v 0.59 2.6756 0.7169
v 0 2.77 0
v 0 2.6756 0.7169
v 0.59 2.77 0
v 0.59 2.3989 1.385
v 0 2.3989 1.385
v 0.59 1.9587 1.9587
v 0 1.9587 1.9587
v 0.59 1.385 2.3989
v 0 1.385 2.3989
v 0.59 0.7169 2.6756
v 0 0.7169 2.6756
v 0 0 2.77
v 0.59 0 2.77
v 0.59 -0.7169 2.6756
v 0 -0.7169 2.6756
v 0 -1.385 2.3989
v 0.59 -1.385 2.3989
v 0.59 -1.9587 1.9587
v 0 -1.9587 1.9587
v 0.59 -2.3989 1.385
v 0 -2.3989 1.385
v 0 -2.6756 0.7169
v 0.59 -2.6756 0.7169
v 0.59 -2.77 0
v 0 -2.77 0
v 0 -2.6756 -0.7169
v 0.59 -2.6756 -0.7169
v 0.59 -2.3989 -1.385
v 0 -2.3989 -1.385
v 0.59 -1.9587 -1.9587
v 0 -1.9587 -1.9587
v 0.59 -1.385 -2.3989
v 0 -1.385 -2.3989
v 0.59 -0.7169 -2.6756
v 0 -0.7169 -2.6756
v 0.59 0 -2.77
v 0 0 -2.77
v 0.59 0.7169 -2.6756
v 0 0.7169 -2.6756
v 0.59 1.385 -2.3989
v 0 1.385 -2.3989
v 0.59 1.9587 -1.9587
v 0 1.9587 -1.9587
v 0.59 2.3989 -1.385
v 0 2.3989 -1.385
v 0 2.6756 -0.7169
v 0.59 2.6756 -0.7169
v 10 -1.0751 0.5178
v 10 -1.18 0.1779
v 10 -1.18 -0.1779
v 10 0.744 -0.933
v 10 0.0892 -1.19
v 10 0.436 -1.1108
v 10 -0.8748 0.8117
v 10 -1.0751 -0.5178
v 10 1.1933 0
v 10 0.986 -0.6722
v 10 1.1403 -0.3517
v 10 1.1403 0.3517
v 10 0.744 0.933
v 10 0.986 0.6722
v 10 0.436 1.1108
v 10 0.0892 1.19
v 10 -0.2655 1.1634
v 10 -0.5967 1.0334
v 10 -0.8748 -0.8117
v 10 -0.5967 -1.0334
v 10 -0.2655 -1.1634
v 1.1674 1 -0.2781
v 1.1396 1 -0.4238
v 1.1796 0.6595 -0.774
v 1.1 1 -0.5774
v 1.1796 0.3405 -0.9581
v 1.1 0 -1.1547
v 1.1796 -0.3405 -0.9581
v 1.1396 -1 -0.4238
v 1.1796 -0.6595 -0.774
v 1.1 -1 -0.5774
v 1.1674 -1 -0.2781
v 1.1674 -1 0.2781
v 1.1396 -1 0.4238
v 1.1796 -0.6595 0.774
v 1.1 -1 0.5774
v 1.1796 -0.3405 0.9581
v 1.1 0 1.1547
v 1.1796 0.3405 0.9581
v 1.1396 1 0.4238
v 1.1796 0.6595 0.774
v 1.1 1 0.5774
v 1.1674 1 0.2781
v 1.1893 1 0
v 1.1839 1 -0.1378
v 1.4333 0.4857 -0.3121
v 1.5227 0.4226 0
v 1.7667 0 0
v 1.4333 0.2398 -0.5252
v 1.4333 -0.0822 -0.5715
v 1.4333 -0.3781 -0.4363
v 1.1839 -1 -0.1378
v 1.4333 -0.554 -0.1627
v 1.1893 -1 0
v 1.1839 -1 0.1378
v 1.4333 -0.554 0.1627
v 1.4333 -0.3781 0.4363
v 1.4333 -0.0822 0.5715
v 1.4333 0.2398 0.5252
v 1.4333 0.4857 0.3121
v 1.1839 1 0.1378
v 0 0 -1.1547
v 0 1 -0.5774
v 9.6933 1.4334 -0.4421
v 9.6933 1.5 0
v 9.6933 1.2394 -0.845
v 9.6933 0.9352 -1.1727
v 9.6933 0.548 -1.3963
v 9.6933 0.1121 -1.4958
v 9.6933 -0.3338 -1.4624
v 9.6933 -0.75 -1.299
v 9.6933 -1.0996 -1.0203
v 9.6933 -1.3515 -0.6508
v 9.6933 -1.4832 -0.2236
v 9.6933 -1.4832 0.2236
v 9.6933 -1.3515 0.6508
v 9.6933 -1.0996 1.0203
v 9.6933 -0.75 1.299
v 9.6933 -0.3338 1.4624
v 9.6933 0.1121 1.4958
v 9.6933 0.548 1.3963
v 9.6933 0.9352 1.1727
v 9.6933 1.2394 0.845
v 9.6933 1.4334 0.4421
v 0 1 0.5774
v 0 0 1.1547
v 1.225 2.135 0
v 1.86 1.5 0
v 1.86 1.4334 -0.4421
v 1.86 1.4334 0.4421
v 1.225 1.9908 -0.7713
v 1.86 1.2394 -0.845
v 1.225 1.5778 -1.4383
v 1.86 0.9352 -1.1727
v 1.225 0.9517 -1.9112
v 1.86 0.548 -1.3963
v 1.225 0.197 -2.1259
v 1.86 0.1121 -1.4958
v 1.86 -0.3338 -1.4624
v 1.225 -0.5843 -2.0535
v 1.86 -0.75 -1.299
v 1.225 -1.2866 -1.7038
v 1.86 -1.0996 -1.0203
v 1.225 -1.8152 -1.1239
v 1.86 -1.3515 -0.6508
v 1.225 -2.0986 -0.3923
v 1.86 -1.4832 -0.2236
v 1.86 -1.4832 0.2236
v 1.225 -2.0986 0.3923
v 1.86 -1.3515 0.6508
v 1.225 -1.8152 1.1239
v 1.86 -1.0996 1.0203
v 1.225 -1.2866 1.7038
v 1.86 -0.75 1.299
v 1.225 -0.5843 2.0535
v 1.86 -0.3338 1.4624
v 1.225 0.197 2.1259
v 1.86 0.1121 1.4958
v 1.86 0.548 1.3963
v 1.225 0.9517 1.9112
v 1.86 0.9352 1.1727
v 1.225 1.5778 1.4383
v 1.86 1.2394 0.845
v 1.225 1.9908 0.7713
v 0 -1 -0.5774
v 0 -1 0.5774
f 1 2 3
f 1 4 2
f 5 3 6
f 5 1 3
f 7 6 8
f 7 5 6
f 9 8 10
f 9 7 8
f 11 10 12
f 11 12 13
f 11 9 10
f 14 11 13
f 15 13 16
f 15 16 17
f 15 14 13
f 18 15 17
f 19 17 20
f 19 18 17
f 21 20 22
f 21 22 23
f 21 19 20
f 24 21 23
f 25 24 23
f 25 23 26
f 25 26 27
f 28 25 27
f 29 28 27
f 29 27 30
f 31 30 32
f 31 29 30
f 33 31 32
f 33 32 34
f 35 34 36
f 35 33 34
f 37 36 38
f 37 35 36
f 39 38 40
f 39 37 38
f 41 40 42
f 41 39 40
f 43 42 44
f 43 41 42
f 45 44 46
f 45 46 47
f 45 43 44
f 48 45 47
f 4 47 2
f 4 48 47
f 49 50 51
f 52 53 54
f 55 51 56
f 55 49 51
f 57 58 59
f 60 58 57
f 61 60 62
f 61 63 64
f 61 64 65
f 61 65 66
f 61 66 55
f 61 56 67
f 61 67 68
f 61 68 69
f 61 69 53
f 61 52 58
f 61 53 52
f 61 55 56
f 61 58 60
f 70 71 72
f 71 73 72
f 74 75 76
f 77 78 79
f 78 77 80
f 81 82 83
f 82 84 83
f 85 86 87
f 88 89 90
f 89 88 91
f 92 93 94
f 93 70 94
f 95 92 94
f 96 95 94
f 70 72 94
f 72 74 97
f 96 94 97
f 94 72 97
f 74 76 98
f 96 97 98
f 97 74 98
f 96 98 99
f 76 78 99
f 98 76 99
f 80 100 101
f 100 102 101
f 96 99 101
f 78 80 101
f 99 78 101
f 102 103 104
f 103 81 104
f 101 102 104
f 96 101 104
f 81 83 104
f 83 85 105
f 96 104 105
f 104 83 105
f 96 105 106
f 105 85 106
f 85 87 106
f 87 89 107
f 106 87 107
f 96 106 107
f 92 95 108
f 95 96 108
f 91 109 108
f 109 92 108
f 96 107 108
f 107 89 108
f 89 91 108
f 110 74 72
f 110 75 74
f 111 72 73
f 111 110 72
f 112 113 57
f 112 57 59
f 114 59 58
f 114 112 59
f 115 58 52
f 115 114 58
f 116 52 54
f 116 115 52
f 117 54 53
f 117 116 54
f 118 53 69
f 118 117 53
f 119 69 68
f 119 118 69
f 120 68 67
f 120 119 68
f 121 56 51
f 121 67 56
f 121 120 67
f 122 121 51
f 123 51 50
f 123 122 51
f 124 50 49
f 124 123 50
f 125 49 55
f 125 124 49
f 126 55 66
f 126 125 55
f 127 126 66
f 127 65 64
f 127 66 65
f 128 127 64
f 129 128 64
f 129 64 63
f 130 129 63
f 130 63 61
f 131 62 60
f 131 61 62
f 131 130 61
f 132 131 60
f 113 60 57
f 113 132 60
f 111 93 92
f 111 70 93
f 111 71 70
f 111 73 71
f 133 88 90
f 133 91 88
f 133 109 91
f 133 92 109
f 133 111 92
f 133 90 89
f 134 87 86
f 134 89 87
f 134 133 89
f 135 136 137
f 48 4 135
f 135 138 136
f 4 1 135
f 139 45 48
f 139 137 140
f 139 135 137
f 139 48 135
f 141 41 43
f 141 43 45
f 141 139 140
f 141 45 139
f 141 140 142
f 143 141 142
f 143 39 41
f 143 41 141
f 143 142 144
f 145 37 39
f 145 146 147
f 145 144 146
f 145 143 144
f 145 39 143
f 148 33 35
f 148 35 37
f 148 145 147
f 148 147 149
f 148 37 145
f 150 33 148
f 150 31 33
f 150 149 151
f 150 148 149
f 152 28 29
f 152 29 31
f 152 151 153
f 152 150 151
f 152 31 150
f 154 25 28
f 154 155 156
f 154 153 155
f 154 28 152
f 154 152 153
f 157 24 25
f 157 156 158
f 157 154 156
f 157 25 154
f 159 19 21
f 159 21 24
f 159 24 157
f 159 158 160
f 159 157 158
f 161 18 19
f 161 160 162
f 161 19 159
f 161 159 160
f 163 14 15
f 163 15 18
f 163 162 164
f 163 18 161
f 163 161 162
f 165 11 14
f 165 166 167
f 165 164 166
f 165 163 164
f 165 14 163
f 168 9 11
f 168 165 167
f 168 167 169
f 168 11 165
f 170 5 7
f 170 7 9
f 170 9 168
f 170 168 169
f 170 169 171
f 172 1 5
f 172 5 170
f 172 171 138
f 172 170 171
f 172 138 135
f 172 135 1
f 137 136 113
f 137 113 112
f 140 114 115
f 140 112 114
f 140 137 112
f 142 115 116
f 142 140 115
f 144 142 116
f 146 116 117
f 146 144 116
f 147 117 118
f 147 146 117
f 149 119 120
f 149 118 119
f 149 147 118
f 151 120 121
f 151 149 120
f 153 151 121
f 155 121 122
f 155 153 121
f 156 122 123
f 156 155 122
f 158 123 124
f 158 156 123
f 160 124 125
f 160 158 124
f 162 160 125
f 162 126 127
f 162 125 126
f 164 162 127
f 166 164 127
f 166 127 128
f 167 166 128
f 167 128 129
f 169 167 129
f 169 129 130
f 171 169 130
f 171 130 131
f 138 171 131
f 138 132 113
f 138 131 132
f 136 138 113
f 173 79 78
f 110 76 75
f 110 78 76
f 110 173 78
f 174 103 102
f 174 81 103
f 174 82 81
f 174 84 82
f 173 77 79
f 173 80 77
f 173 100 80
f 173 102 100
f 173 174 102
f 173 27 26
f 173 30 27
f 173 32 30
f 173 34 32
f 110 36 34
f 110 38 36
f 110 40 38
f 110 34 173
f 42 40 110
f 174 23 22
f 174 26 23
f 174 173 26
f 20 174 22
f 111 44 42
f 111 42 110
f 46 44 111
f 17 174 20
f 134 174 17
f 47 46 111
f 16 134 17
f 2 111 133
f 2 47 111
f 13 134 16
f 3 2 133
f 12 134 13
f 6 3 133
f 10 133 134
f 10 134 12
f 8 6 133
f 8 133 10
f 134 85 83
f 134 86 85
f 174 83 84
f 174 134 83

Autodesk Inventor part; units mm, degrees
ref_plane "YZ Plane" through (0, 0, 0) normal (1, 0, 0) x (0, 1, 0)
ref_plane "XZ Plane" through (0, 0, 0) normal (0, 1, 0) x (-1, 0, 0)
sketch "Sketch1" plane through (0, 0, 0) normal (0, 0, 1) x (1, 0, 0)
  line L0 (10, 0) -> (10, 1.5)
  line L1 (10, 1.5) -> (3.36, 1.5)
  line L2 (3.36, 1.5) -> (3.0533, 1.5)
  line L3 (0, 2.77) -> (0, 1.1547)
  line L4 (0, 1.1547) -> (1.1, 1.1547)
  line L5 (1.1, 1.1547) -> (1.7667, 0)
  line L6 (1.7667, 0) -> (10, 0)
  line L7 (0, 2.77) -> (0.59, 2.77)
  line L8 (0.59, 2.77) -> (1.86, 1.5)
  line L9 (3.0533, 1.5) -> (1.86, 1.5)
  line L10 (3.36, 1.5) -> (1.86, 1.5) construction
  line L11 (1.86, 1.5) -> (1.86, 1.5)
  line L12 (-2, 0) -> (12, 0) projected
  line L13 (0, -0.554) -> (0, 3.324) projected
  dimension "d0" = 10
  dimension "d1" = 6.64
  dimension "d2" = 1.1
  dimension "d3" = 3
  dimension "d6" = 1.86
  dimension "d7" = 45
  dimension "d8" = 2.3094
  dimension "d9" = 60
  dimension "d10" = 5.54
  dimension "d11" = 3
  dimension "d12" = 0.3067
revolve "Body" add sketch "Sketch1" angle 360 about axis through (1.7667, 0, 0) along (1, 0, 0) contours L6 L5 L4 L3 L7 L8 L9 L2 L1 L0
sketch "Sketch2" plane through (0, 0, 0) normal (-1, 0, 0) x (0, 0, 1)
  circle A0 centre (0, 0) radius 1.1547 projected
  line L0 (0, -3.878) -> (0, 3.878) projected
  line L1 (-3.878, 0) -> (3.878, 0) projected
  line L2 (1.1547, 0) -> (0.5774, -1)
  line L3 (0.5774, -1) -> (-0.5774, -1)
  line L4 (-0.5774, -1) -> (-1.1547, 0)
  line L5 (-1.1547, 0) -> (-0.5774, 1)
  line L6 (-0.5774, 1) -> (0.5774, 1)
  line L7 (0.5774, 1) -> (1.1547, 0)
  point P0 (0, 1.1547)
extrude "Slot" add sketch "Sketch2" against normal up to next contours L7 A0 | A0 L2 | L6 L0 A0 | A0 L0 L3 | L0 L6 A0 | A0 L3 L0 | L4 A0 | A0 L5
thread "Thread" size "M3x0.5" class "6g" standard "ISO Metric profile" length 6.64
chamfer "Chamfer1" distance 0.3067 distance2 0.3067 1 edges at (10, -1.5, 0) measured on face at (10, -0.8298, -0.2045)
ref_plane "Work Plane1" through (104.775, 0, 0) normal (0, 0, -1) x (1, 0, 0)
equation "\"d15\" = GEL"
equation "\"d17\" = -0.5 * SPD + 0.5 * GD"
equation "\"d18\" = GUL"
equation "\"d0\" = NLG"
equation "\"d1\" = GEL"
equation "\"d2\" = INTI"
equation "\"d3\" = GD"
equation "\"d6\" = KOH"
equation "\"d7\" = 0.5 * SEWI"
equation "\"d8\" = 1.1547 * SW"
equation "\"d10\" = KOD"
equation "\"d11\" = BDM"
equation "\"d12\" = GAL"
equation "\"NLG\" = 10"
equation "\"INTI\" = 1.1"
equation "\"GEL\" = 6.64"
equation "\"GAL\" = 0.61345 * PTC"
equation "\"KOH\" = 1.86"
equation "\"KOD\" = 5.54"
equation "\"GUL\" = 0.61345 * PTC"
equation "\"SPD\" = NND - 1.2269 * PTC"
equation "\"BDM\" = NND"
equation "\"GD\" = NND"
equation "\"SEWI\" = 90deg"
equation "\"SW\" = 2"
equation "\"TOA\" = 30deg"
equation "\"GD1\" = THREADDIA - 1.2269 * PTC"
equation "\"EPV\" = 3.36"
equation "\"THREADDIA\" = 3"
equation "\"PTC\" = 0.5"
equation "\"NND\" = 3"
equation "\"E0\" = 2.31"
properties part number "ISO 10642  - M3  x  10" material "Steel"
